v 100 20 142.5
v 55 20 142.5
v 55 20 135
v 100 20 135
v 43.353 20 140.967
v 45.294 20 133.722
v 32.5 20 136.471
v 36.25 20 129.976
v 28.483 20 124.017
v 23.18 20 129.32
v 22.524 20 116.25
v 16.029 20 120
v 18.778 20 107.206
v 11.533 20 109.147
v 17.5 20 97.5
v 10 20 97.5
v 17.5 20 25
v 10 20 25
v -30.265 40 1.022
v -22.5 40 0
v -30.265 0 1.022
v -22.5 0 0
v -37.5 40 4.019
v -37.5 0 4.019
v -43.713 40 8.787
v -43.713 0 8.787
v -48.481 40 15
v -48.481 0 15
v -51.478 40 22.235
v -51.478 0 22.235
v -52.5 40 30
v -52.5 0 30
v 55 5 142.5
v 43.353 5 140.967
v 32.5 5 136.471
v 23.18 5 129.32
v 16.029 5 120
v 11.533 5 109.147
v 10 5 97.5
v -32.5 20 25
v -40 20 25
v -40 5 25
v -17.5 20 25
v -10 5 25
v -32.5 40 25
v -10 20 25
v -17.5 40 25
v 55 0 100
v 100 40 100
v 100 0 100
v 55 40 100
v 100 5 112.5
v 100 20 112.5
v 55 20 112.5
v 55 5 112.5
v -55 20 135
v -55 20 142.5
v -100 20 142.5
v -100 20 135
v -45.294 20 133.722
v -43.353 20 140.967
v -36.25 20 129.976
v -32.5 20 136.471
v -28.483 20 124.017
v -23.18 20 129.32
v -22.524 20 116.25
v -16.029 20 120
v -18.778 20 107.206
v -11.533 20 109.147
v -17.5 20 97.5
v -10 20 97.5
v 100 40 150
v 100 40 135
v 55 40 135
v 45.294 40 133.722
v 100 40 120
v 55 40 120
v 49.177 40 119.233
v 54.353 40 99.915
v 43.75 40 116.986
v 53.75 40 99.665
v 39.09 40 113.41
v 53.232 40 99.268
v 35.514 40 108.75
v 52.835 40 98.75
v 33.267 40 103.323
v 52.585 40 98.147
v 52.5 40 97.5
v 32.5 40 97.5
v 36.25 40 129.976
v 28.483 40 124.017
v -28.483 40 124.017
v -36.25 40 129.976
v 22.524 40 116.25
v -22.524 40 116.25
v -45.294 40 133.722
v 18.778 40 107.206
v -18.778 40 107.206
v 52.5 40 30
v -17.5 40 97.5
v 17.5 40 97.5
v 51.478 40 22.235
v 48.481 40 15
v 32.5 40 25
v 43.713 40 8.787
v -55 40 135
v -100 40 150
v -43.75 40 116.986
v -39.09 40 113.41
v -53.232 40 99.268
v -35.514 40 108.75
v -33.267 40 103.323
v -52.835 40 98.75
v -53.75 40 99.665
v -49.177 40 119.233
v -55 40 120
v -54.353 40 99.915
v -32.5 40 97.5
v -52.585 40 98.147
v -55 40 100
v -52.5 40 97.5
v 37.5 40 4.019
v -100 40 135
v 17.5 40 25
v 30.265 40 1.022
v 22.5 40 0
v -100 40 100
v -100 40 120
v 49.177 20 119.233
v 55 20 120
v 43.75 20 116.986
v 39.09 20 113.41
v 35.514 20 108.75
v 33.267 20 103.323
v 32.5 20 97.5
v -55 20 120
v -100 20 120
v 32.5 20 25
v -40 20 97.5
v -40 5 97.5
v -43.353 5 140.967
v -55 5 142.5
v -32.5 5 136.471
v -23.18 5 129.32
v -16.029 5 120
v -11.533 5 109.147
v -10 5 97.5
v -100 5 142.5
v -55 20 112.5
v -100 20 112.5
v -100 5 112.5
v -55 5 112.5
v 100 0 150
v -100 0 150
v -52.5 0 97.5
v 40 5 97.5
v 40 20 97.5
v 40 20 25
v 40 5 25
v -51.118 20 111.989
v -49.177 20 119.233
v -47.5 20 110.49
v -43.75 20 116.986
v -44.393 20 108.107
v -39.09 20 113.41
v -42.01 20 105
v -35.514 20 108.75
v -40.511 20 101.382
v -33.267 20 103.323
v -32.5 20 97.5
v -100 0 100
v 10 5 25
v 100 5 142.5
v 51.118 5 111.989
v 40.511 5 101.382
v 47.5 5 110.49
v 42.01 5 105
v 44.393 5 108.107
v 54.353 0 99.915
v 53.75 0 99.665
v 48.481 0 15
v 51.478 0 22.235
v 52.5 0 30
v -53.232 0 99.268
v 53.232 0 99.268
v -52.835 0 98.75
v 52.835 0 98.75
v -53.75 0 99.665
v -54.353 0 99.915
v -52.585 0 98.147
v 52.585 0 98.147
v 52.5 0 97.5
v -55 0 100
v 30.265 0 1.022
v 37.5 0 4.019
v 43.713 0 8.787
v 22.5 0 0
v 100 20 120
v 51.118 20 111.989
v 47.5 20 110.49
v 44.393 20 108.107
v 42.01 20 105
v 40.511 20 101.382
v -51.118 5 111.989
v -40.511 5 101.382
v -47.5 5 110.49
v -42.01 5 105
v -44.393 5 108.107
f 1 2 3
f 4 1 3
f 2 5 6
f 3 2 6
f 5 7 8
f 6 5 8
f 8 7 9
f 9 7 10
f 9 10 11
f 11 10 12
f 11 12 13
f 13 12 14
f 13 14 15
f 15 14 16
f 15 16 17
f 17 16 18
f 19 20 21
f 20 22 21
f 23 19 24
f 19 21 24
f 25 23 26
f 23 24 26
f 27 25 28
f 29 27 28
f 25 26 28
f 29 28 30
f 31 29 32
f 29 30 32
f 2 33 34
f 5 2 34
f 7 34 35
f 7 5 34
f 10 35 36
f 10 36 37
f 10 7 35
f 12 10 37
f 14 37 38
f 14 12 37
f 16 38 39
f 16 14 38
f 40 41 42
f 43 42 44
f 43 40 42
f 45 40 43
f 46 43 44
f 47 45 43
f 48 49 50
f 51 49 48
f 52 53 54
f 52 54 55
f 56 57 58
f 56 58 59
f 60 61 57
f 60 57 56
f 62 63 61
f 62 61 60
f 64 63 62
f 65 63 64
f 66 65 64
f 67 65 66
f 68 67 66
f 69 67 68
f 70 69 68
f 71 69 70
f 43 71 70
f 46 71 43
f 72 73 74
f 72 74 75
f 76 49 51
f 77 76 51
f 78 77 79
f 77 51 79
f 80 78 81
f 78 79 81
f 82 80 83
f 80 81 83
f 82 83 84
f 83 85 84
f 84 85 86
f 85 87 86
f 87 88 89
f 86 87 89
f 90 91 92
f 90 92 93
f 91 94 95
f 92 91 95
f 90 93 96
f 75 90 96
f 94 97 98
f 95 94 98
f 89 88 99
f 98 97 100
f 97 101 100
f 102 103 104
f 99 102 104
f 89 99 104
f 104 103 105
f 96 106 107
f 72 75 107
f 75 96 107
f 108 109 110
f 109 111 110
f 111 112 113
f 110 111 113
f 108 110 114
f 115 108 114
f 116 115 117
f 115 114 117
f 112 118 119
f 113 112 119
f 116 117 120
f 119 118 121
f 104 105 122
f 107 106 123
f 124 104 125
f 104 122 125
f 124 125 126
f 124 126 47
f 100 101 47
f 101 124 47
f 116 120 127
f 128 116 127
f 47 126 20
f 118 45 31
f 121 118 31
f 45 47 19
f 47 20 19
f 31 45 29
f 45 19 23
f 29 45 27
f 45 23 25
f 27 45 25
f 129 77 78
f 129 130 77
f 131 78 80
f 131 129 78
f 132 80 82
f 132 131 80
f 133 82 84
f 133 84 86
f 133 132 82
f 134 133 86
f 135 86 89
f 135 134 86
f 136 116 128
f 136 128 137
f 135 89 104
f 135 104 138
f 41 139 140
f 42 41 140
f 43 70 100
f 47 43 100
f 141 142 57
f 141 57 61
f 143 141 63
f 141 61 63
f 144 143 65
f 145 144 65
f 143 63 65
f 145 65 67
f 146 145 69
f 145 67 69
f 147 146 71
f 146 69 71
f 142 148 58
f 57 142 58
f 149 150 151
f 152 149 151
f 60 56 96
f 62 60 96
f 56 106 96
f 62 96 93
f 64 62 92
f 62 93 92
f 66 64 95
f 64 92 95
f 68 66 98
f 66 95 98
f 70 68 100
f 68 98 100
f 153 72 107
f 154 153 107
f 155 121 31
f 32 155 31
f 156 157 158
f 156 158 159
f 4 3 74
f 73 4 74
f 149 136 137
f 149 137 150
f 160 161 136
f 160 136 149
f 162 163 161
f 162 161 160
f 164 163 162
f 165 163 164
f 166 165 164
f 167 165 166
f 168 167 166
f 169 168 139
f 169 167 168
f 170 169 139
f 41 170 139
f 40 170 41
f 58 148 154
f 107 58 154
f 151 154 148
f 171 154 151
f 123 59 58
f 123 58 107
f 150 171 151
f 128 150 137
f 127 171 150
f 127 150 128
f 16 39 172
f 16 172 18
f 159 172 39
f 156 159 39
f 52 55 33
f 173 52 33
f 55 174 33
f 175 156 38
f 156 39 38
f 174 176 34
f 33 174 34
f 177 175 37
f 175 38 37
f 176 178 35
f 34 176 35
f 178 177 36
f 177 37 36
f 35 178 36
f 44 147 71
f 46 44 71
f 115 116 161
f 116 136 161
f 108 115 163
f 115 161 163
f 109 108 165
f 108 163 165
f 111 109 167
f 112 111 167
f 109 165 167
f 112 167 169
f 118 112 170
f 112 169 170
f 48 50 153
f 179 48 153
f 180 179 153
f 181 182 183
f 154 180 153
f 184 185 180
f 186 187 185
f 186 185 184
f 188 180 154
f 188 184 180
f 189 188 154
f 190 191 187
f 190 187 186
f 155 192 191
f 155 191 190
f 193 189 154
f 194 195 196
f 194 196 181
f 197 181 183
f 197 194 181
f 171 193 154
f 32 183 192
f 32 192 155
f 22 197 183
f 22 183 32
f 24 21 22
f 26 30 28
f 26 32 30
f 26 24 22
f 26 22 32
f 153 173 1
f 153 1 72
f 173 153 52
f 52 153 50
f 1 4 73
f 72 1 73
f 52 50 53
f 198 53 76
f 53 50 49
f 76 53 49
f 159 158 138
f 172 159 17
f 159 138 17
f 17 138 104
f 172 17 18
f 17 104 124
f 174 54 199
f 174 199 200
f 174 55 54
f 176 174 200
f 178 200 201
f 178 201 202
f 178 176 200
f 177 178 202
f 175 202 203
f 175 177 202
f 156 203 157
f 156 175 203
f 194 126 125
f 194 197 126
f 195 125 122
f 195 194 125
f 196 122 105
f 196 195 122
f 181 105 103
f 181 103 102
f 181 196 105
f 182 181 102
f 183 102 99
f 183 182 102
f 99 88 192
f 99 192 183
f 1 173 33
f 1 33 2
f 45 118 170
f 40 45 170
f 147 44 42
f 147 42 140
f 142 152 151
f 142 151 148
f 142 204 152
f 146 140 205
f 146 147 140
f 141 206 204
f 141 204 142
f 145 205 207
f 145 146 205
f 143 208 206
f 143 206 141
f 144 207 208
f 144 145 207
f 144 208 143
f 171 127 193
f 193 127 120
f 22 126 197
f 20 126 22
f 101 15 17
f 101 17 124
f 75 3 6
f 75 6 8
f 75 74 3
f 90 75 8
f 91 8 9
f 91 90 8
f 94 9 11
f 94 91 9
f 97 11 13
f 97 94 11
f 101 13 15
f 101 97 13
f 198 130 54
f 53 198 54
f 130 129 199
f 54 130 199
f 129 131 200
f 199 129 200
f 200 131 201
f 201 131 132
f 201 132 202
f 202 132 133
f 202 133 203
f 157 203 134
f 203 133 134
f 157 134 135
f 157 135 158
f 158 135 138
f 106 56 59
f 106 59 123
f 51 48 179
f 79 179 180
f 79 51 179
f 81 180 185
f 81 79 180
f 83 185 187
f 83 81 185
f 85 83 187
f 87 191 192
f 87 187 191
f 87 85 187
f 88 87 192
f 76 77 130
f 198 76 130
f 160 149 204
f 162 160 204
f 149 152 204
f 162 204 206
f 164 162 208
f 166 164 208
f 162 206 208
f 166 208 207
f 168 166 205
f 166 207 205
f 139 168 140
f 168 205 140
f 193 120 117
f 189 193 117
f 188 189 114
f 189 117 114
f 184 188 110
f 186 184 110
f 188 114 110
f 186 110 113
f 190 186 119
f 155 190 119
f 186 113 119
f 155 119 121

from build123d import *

# Parameters (mm, degrees)
SKETCH1_W            = 100
SKETCH1_H            = 40
BOSS_EXTRUDE1_DEPTH  = 150
CUT_EXTRUDE1_DEPTH   = 41
FILLET1_R            = 30
FILLET1_OF_MIRROR1_R = 30


with BuildPart() as part:
    # Sketch1 → Boss-Extrude1 (new body)
    with BuildSketch(Plane.XY):
        with Locations((-50, 20)):
            Rectangle(SKETCH1_W, SKETCH1_H)
    boss_extrude1 = extrude(amount=BOSS_EXTRUDE1_DEPTH)

    # Cut-Sweep1: sweep along a path in Sketch3
    with BuildLine(Plane(origin=(0, 40, 0), x_dir=(1, 0, 0), z_dir=(0, 1, 0))) as cut_sweep1_path:
        Line((-100, -127.5), (-55, -127.5))
        ThreePointArc((-55, -127.5), (-33.786796564, -118.713203436), (-25, -97.5))
        Line((-25, -97.5), (-25, -25))
    # Sketch2 → Cut-Sweep1 (sweep, cut)
    with BuildSketch(Plane.ZY.offset(100)):
        Polygon((135, 40), (120, 40), (120, 20), (112.5, 20), (112.5, 5), (142.5, 5), (142.5, 20), (135, 20), align=None)
    cut_sweep1 = sweep(path=cut_sweep1_path.line, mode=Mode.SUBTRACT)

    # Sketch4 → Cut-Extrude1 (cut, through all)
    with BuildSketch(Plane(origin=(0, 40, 0), x_dir=(1, 0, 0), z_dir=(0, 1, 0))):
        with BuildLine():
            Line((-52.5, -25), (-52.5, 0))
            Line((-52.5, 0), (-100, 0))
            Line((-100, 0), (-100, -100))
            Line((-100, -100), (-55, -100))
            ThreePointArc((-55, -100), (-53.232233047, -99.267766953), (-52.5, -97.5))
            Line((-52.5, -97.5), (-52.5, -25))
        make_face()
    cut_extrude1 = extrude(amount=-CUT_EXTRUDE1_DEPTH, mode=Mode.SUBTRACT)

    # Fillet1
    fillet1_edges = [part.edges().sort_by_distance(p)[0] for p in [
        (-52.5, 20, 0),
    ]]
    fillet(fillet1_edges, radius=FILLET1_R)

    # Mirror1: Boss-Extrude1, Cut-Sweep1, Cut-Extrude1 across plane
    add(boss_extrude1.mirror(Plane(origin=(0, 0, 150), x_dir=(0, 0, 1), z_dir=(-1, 0, 0))))
    add(cut_sweep1.mirror(Plane(origin=(0, 0, 150), x_dir=(0, 0, 1), z_dir=(-1, 0, 0))), mode=Mode.SUBTRACT)
    add(cut_extrude1.mirror(Plane(origin=(0, 0, 150), x_dir=(0, 0, 1), z_dir=(-1, 0, 0))), mode=Mode.SUBTRACT)

    # Fillet1 of Mirror1
    fillet1_of_mirror1_edges = [part.edges().sort_by_distance(p)[0] for p in [
        (52.5, 20, 0),
    ]]
    fillet(fillet1_of_mirror1_edges, radius=FILLET1_OF_MIRROR1_R)


solid = part.part
